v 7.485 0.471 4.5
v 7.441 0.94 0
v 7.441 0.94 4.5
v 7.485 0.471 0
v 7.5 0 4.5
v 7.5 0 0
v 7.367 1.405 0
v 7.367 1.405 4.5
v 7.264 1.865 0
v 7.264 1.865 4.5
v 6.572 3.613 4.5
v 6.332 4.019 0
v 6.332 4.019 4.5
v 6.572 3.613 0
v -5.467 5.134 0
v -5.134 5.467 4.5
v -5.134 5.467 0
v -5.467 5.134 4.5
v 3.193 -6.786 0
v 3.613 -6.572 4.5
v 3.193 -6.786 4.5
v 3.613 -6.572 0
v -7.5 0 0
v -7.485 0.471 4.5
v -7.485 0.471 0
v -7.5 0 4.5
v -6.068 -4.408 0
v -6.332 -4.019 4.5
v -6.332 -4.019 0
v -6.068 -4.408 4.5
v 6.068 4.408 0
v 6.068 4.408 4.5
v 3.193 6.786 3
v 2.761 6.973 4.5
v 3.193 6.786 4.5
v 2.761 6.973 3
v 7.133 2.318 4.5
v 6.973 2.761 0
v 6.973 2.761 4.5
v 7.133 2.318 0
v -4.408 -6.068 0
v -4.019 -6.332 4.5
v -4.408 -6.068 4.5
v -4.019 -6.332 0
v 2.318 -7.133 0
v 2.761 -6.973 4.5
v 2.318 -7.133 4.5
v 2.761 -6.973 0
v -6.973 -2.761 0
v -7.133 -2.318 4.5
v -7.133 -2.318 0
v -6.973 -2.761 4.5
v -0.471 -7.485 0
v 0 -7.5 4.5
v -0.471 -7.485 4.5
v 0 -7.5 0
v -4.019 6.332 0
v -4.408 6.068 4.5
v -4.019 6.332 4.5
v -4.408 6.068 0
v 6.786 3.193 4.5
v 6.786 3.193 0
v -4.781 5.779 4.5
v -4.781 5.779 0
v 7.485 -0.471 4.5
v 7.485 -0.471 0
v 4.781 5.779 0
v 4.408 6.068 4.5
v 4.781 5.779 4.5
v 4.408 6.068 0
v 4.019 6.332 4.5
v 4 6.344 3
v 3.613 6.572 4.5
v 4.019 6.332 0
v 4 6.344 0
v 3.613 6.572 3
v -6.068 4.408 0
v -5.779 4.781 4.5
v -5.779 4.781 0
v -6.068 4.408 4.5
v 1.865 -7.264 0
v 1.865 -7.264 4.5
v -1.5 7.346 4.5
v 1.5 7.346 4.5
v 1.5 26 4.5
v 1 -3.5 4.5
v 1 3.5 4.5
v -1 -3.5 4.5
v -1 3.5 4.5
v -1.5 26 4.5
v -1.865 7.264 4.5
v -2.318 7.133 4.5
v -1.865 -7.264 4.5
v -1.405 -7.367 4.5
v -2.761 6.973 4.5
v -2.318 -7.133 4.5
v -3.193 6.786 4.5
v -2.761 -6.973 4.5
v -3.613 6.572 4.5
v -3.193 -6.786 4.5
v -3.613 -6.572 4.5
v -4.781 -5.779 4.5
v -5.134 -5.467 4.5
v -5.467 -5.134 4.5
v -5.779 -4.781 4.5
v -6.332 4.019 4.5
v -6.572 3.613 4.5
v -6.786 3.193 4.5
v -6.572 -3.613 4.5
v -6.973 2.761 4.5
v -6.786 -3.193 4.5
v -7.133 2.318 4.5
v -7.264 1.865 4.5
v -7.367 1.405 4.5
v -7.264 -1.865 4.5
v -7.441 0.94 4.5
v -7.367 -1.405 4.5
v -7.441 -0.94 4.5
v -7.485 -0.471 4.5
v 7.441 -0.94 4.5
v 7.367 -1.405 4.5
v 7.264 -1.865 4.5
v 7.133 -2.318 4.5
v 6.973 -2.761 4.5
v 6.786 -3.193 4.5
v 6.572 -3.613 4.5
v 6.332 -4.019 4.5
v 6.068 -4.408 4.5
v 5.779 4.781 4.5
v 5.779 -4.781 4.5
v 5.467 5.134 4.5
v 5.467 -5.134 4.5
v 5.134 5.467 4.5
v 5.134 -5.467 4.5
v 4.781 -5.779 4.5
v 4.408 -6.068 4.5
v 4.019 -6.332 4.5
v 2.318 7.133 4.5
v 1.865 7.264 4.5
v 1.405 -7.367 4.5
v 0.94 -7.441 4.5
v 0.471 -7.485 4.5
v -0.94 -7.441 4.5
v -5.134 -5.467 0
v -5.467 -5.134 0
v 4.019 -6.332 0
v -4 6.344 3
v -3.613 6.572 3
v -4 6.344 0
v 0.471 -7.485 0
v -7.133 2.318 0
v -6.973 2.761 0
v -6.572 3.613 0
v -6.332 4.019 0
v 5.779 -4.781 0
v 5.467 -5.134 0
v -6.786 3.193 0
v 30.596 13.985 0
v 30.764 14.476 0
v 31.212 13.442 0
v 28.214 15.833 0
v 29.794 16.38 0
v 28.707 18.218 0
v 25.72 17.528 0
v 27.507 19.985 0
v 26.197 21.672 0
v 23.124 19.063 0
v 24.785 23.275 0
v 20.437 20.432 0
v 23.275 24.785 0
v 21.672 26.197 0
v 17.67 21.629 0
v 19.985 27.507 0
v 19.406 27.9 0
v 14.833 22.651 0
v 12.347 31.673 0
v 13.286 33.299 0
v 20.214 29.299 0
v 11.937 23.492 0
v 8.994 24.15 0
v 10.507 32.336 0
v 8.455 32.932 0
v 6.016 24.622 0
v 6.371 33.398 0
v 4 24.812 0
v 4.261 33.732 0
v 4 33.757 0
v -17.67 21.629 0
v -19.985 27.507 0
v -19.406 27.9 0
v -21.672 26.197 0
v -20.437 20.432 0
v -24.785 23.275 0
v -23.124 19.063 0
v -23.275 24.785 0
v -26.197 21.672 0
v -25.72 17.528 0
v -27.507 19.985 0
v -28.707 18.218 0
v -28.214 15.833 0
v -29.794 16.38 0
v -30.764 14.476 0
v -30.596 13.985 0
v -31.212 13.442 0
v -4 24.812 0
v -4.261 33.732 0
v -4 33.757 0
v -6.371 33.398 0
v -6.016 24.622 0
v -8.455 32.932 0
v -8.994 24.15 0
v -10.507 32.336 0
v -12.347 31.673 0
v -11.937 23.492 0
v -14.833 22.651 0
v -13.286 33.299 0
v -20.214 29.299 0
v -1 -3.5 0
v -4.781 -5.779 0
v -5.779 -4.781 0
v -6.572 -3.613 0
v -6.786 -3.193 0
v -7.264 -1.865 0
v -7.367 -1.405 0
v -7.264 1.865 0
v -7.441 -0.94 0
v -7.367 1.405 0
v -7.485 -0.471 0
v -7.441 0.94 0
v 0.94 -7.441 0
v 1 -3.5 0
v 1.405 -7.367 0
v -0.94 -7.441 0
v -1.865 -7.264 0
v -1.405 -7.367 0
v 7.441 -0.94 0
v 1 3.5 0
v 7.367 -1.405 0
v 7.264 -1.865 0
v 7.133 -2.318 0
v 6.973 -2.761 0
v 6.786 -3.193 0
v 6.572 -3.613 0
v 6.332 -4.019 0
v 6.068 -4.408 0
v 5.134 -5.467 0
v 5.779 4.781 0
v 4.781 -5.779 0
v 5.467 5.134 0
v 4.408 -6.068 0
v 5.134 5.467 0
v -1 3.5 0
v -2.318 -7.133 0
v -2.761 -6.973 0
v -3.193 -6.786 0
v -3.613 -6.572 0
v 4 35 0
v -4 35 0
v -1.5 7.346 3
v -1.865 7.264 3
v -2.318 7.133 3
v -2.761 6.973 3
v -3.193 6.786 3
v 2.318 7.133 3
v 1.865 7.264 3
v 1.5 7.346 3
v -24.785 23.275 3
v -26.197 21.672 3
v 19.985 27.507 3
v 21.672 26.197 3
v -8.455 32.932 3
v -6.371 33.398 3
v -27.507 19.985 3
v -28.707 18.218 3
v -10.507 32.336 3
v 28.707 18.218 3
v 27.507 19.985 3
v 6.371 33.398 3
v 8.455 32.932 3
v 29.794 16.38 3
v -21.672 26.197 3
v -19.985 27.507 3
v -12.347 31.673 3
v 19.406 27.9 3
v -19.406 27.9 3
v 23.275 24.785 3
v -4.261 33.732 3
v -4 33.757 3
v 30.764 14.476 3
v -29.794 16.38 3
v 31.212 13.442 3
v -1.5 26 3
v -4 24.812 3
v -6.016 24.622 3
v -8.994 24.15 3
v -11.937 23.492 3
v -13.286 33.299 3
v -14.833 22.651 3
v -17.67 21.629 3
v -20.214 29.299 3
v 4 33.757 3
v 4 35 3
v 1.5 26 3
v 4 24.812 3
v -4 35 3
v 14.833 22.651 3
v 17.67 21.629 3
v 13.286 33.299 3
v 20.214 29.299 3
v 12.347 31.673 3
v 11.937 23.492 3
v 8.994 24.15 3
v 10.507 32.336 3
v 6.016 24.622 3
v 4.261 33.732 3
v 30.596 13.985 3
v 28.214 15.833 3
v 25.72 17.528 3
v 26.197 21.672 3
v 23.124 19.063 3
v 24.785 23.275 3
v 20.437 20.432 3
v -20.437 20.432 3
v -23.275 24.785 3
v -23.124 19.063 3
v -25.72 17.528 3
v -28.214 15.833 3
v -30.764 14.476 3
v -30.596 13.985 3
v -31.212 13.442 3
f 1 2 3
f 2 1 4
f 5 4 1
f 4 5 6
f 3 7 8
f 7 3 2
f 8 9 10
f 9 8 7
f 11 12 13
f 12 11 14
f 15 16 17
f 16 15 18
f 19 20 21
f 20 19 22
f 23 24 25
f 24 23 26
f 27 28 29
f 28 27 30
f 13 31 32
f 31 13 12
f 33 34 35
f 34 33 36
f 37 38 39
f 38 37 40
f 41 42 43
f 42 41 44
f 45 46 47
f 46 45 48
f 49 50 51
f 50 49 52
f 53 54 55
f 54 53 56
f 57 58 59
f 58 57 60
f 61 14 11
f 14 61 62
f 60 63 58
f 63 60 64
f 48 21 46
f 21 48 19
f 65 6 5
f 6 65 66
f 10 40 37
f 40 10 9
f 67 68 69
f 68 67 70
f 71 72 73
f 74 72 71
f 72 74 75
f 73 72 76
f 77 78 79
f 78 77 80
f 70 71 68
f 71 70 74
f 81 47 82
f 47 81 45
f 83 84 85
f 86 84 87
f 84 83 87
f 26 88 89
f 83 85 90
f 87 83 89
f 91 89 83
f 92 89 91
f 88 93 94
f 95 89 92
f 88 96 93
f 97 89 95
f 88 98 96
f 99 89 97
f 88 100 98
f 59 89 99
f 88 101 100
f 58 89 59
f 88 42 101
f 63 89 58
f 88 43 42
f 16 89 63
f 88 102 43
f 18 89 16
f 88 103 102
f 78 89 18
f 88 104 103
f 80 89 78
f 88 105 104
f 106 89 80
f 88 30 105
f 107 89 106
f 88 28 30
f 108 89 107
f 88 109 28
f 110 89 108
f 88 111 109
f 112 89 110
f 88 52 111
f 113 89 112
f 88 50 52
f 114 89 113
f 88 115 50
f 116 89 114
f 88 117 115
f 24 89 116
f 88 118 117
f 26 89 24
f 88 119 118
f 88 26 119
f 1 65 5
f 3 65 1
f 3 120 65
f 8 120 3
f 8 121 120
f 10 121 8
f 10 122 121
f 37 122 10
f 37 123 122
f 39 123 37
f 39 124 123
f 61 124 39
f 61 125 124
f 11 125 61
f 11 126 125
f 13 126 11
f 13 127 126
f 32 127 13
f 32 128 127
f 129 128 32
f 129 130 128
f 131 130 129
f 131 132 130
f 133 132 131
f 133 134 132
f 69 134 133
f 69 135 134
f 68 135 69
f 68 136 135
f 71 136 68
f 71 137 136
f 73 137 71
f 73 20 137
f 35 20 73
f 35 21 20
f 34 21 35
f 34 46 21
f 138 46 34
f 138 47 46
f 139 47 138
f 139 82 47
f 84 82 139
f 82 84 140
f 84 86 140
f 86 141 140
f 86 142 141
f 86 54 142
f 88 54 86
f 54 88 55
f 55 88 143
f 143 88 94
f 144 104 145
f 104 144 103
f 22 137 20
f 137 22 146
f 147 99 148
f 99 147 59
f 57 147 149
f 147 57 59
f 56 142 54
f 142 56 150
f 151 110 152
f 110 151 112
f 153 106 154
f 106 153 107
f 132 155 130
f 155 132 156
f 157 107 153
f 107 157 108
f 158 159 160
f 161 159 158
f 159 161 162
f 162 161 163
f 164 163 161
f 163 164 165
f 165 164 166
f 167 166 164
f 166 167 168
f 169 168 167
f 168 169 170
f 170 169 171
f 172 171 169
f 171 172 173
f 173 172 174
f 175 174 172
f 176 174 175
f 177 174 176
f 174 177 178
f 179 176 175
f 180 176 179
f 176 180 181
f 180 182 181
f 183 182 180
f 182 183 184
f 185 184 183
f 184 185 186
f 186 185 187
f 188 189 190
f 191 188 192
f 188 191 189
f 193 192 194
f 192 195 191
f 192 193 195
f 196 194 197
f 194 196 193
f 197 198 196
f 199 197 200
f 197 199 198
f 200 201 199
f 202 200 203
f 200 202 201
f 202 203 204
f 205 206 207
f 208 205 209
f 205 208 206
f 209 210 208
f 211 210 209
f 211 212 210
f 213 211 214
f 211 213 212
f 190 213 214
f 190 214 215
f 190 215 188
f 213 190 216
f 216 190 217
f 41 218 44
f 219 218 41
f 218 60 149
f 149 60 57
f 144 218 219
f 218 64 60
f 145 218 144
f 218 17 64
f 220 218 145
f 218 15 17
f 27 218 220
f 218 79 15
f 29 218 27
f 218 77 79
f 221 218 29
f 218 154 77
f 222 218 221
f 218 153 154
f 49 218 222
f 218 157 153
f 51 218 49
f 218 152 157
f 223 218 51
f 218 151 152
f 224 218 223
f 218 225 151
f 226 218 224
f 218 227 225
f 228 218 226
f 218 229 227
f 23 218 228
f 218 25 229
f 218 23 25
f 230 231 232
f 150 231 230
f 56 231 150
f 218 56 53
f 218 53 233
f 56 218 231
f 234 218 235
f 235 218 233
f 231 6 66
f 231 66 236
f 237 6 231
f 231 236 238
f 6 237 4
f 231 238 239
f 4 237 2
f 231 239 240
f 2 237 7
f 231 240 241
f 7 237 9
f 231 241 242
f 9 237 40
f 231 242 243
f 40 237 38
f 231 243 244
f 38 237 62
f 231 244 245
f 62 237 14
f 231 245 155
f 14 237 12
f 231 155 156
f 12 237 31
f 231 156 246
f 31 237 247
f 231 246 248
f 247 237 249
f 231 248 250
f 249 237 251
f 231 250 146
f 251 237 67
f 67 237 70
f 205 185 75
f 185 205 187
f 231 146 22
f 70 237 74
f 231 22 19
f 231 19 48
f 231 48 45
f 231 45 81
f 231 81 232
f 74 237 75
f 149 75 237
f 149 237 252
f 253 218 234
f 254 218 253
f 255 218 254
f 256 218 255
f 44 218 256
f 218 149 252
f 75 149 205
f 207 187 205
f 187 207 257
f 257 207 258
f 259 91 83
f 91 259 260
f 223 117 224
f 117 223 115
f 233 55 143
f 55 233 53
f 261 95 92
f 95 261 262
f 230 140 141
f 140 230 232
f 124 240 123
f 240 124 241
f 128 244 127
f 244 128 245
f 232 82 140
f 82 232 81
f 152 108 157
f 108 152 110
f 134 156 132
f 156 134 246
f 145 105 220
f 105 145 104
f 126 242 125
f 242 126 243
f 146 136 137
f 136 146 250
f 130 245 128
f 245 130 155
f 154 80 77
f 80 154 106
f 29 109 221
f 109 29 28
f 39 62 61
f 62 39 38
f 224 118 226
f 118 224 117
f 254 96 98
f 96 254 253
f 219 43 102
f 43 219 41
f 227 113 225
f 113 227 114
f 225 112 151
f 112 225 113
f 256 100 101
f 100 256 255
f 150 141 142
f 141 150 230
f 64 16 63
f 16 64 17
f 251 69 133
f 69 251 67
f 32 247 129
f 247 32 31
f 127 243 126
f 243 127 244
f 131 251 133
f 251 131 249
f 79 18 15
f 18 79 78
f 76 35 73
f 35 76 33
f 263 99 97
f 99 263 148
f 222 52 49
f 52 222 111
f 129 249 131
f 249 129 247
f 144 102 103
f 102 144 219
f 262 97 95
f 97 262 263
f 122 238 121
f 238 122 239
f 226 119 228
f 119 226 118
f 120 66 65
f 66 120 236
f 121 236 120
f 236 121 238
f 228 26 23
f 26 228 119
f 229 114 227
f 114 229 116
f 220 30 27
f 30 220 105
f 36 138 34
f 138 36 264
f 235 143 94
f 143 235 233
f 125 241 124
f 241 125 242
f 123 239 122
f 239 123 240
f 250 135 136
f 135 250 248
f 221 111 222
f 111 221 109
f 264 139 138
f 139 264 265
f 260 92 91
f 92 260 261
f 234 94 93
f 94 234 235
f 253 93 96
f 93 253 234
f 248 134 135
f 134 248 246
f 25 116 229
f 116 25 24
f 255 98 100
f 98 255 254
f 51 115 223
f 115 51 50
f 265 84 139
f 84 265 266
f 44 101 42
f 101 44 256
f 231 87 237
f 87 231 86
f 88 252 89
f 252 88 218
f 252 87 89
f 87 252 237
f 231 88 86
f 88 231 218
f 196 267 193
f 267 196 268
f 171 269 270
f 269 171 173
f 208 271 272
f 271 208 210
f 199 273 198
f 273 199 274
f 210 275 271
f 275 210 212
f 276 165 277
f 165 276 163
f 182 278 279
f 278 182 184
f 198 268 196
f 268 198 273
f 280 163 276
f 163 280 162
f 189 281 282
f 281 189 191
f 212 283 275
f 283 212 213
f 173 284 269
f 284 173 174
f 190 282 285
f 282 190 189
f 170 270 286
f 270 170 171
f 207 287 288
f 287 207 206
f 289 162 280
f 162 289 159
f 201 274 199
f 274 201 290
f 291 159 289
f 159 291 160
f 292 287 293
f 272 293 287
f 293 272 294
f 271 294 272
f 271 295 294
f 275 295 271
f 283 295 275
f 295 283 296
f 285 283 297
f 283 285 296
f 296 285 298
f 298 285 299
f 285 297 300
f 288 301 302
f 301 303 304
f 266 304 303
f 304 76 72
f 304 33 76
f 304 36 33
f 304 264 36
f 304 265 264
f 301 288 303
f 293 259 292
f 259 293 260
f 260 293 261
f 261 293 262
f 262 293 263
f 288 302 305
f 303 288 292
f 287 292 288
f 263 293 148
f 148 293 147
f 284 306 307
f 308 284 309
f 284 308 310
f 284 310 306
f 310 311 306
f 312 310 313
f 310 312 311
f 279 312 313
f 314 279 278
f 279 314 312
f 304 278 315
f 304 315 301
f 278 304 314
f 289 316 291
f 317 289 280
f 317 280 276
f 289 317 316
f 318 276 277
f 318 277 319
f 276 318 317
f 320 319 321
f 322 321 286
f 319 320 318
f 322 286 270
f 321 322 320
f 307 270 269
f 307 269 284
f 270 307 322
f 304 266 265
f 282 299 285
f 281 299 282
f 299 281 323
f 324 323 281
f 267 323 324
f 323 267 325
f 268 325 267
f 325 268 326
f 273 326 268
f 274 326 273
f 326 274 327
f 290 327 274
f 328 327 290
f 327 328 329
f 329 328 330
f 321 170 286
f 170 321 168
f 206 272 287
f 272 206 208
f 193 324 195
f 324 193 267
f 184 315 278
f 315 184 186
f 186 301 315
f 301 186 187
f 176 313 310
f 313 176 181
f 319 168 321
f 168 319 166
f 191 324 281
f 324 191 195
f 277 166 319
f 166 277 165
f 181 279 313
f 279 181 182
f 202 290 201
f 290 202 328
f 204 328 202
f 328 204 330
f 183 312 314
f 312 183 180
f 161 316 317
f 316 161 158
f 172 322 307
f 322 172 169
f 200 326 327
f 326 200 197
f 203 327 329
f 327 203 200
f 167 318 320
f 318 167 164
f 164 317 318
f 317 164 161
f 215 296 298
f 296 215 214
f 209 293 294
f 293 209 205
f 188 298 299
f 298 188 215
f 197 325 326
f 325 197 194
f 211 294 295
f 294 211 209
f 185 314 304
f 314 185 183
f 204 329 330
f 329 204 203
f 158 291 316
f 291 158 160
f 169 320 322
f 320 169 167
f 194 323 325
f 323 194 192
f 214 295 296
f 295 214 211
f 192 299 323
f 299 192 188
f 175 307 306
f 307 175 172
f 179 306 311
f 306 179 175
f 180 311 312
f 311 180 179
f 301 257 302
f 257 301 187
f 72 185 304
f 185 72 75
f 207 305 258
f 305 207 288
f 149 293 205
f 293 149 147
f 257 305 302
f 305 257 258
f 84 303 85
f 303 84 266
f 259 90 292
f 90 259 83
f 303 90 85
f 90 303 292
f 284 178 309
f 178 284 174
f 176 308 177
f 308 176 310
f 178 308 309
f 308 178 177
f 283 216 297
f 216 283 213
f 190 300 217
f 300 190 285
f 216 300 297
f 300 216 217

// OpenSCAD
 $fn=100;
 
 h=4.5;
 union(){
 difference(){
 cylinder(h=h,r=7.5);
     cube([2,7,20],center=true);
 }//центр крепление
 
 translate([0,20,h/2-1.5/2])cube([8,30,h-1.5],center=true);//ножка
 
 translate([0,15,h-1.5])cube([3,22,h-1.5],center=true);
 
 difference()
 {
 translate([0,0,0])cylinder(h=h-1.5, r=34);
 translate([0,-23,-0.05]) cylinder(h=4.6-1.5, r = 48);   
      
 }    
 
translate([16,30,(h-1.5)/2])rotate([0,0,-30])cube([8,3,h-1.5],center=true); 
translate([-16,30,(h-1.5)/2])rotate([0,0,30])cube([8,3,h-1.5],center=true);  
 }
 
